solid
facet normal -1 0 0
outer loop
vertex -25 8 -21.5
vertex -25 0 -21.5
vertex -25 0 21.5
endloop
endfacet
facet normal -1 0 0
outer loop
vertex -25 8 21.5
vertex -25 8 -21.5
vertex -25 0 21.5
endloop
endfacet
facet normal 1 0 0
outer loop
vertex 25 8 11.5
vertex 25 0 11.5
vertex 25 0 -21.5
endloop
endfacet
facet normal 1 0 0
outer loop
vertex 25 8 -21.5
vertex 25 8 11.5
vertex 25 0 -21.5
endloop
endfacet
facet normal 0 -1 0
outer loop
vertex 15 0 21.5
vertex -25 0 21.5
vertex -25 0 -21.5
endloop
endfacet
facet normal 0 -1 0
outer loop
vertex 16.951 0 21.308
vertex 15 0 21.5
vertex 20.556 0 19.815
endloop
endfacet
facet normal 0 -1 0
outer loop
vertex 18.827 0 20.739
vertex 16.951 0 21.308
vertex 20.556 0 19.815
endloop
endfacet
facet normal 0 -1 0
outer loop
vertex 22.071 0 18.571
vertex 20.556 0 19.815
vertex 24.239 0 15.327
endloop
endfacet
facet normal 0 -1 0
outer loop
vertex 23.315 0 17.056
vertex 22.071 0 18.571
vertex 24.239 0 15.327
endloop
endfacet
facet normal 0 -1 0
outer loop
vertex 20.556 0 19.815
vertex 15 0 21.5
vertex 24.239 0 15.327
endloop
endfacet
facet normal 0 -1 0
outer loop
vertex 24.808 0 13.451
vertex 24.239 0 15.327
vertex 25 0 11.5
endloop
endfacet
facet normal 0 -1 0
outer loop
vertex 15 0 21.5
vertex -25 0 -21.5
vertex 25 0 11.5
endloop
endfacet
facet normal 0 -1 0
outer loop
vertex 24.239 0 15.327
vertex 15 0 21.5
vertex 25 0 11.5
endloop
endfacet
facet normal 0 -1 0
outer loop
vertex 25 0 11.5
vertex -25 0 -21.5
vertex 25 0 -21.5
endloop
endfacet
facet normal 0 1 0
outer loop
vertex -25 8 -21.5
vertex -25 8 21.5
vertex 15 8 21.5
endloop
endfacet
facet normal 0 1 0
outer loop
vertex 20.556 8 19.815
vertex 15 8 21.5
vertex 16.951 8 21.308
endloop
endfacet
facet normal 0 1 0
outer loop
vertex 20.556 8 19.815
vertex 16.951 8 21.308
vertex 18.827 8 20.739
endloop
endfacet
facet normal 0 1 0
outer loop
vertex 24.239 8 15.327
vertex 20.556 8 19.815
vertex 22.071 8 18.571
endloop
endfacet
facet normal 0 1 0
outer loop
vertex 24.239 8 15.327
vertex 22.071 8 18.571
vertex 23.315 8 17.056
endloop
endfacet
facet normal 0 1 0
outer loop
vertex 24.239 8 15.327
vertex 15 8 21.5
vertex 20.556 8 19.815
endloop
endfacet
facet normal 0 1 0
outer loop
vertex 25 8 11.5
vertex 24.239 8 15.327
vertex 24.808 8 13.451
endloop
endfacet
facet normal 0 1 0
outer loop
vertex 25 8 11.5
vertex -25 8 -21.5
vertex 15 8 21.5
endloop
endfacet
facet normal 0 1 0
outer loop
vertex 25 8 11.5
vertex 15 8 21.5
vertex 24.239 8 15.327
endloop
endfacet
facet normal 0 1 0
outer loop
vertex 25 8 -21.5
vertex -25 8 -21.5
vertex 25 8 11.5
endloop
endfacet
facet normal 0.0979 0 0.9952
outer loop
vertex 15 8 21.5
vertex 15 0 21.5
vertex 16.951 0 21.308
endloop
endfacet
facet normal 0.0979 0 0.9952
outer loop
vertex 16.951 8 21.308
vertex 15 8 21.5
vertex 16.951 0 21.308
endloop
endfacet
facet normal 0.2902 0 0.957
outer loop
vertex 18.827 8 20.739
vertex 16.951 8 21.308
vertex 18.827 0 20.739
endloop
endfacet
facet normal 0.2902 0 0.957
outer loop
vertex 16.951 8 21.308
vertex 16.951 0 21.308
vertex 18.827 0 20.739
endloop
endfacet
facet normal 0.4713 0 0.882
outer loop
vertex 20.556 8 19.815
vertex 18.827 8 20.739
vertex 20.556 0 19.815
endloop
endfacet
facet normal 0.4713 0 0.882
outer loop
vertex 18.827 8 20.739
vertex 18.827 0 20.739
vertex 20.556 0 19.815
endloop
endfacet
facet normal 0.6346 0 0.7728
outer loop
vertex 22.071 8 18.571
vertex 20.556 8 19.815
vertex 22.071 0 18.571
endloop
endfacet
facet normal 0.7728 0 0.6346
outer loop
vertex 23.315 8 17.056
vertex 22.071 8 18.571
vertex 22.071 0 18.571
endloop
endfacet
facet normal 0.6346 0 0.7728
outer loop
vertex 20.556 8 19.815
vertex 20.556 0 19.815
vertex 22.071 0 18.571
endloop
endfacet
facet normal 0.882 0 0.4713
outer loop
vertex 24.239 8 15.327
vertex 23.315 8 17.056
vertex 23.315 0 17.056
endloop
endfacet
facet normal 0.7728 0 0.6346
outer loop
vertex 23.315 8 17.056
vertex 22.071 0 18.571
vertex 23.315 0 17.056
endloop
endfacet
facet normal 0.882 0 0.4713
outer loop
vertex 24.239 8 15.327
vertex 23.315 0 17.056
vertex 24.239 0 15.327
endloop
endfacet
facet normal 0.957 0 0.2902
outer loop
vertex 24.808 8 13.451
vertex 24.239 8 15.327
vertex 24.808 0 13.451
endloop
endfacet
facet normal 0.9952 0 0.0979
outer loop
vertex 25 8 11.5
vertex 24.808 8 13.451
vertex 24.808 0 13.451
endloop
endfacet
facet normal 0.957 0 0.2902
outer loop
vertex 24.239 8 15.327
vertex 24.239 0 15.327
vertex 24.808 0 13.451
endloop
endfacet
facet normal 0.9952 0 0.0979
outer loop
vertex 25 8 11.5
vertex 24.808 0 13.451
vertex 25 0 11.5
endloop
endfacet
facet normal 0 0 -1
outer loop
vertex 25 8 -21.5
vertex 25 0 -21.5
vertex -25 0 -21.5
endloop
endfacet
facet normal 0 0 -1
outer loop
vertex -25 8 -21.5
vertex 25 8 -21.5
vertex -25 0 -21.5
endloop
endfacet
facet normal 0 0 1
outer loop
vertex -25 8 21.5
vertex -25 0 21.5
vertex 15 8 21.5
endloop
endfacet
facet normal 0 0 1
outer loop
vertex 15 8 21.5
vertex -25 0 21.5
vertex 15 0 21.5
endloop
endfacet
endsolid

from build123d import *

# Parameters (mm, degrees)
EXTRUDE_1_DEPTH = 8


with BuildPart() as part:
    # Эскиз1 → Бобышка-Вытянуть1 (new body)
    with BuildSketch(Plane(origin=(0, 0, 0), x_dir=(1, 0, 0), z_dir=(0, 1, 0))):
        with BuildLine():
            Line((-25, -21.5), (15, -21.5))
            ThreePointArc((15, -21.5), (22.071067812, -18.571067812), (25, -11.5))
            Line((25, -11.5), (25, 21.5))
            Line((25, 21.5), (-25, 21.5))
            Line((-25, 21.5), (-25, -21.5))
        make_face()
    extrude(amount=EXTRUDE_1_DEPTH)


solid = part.part
